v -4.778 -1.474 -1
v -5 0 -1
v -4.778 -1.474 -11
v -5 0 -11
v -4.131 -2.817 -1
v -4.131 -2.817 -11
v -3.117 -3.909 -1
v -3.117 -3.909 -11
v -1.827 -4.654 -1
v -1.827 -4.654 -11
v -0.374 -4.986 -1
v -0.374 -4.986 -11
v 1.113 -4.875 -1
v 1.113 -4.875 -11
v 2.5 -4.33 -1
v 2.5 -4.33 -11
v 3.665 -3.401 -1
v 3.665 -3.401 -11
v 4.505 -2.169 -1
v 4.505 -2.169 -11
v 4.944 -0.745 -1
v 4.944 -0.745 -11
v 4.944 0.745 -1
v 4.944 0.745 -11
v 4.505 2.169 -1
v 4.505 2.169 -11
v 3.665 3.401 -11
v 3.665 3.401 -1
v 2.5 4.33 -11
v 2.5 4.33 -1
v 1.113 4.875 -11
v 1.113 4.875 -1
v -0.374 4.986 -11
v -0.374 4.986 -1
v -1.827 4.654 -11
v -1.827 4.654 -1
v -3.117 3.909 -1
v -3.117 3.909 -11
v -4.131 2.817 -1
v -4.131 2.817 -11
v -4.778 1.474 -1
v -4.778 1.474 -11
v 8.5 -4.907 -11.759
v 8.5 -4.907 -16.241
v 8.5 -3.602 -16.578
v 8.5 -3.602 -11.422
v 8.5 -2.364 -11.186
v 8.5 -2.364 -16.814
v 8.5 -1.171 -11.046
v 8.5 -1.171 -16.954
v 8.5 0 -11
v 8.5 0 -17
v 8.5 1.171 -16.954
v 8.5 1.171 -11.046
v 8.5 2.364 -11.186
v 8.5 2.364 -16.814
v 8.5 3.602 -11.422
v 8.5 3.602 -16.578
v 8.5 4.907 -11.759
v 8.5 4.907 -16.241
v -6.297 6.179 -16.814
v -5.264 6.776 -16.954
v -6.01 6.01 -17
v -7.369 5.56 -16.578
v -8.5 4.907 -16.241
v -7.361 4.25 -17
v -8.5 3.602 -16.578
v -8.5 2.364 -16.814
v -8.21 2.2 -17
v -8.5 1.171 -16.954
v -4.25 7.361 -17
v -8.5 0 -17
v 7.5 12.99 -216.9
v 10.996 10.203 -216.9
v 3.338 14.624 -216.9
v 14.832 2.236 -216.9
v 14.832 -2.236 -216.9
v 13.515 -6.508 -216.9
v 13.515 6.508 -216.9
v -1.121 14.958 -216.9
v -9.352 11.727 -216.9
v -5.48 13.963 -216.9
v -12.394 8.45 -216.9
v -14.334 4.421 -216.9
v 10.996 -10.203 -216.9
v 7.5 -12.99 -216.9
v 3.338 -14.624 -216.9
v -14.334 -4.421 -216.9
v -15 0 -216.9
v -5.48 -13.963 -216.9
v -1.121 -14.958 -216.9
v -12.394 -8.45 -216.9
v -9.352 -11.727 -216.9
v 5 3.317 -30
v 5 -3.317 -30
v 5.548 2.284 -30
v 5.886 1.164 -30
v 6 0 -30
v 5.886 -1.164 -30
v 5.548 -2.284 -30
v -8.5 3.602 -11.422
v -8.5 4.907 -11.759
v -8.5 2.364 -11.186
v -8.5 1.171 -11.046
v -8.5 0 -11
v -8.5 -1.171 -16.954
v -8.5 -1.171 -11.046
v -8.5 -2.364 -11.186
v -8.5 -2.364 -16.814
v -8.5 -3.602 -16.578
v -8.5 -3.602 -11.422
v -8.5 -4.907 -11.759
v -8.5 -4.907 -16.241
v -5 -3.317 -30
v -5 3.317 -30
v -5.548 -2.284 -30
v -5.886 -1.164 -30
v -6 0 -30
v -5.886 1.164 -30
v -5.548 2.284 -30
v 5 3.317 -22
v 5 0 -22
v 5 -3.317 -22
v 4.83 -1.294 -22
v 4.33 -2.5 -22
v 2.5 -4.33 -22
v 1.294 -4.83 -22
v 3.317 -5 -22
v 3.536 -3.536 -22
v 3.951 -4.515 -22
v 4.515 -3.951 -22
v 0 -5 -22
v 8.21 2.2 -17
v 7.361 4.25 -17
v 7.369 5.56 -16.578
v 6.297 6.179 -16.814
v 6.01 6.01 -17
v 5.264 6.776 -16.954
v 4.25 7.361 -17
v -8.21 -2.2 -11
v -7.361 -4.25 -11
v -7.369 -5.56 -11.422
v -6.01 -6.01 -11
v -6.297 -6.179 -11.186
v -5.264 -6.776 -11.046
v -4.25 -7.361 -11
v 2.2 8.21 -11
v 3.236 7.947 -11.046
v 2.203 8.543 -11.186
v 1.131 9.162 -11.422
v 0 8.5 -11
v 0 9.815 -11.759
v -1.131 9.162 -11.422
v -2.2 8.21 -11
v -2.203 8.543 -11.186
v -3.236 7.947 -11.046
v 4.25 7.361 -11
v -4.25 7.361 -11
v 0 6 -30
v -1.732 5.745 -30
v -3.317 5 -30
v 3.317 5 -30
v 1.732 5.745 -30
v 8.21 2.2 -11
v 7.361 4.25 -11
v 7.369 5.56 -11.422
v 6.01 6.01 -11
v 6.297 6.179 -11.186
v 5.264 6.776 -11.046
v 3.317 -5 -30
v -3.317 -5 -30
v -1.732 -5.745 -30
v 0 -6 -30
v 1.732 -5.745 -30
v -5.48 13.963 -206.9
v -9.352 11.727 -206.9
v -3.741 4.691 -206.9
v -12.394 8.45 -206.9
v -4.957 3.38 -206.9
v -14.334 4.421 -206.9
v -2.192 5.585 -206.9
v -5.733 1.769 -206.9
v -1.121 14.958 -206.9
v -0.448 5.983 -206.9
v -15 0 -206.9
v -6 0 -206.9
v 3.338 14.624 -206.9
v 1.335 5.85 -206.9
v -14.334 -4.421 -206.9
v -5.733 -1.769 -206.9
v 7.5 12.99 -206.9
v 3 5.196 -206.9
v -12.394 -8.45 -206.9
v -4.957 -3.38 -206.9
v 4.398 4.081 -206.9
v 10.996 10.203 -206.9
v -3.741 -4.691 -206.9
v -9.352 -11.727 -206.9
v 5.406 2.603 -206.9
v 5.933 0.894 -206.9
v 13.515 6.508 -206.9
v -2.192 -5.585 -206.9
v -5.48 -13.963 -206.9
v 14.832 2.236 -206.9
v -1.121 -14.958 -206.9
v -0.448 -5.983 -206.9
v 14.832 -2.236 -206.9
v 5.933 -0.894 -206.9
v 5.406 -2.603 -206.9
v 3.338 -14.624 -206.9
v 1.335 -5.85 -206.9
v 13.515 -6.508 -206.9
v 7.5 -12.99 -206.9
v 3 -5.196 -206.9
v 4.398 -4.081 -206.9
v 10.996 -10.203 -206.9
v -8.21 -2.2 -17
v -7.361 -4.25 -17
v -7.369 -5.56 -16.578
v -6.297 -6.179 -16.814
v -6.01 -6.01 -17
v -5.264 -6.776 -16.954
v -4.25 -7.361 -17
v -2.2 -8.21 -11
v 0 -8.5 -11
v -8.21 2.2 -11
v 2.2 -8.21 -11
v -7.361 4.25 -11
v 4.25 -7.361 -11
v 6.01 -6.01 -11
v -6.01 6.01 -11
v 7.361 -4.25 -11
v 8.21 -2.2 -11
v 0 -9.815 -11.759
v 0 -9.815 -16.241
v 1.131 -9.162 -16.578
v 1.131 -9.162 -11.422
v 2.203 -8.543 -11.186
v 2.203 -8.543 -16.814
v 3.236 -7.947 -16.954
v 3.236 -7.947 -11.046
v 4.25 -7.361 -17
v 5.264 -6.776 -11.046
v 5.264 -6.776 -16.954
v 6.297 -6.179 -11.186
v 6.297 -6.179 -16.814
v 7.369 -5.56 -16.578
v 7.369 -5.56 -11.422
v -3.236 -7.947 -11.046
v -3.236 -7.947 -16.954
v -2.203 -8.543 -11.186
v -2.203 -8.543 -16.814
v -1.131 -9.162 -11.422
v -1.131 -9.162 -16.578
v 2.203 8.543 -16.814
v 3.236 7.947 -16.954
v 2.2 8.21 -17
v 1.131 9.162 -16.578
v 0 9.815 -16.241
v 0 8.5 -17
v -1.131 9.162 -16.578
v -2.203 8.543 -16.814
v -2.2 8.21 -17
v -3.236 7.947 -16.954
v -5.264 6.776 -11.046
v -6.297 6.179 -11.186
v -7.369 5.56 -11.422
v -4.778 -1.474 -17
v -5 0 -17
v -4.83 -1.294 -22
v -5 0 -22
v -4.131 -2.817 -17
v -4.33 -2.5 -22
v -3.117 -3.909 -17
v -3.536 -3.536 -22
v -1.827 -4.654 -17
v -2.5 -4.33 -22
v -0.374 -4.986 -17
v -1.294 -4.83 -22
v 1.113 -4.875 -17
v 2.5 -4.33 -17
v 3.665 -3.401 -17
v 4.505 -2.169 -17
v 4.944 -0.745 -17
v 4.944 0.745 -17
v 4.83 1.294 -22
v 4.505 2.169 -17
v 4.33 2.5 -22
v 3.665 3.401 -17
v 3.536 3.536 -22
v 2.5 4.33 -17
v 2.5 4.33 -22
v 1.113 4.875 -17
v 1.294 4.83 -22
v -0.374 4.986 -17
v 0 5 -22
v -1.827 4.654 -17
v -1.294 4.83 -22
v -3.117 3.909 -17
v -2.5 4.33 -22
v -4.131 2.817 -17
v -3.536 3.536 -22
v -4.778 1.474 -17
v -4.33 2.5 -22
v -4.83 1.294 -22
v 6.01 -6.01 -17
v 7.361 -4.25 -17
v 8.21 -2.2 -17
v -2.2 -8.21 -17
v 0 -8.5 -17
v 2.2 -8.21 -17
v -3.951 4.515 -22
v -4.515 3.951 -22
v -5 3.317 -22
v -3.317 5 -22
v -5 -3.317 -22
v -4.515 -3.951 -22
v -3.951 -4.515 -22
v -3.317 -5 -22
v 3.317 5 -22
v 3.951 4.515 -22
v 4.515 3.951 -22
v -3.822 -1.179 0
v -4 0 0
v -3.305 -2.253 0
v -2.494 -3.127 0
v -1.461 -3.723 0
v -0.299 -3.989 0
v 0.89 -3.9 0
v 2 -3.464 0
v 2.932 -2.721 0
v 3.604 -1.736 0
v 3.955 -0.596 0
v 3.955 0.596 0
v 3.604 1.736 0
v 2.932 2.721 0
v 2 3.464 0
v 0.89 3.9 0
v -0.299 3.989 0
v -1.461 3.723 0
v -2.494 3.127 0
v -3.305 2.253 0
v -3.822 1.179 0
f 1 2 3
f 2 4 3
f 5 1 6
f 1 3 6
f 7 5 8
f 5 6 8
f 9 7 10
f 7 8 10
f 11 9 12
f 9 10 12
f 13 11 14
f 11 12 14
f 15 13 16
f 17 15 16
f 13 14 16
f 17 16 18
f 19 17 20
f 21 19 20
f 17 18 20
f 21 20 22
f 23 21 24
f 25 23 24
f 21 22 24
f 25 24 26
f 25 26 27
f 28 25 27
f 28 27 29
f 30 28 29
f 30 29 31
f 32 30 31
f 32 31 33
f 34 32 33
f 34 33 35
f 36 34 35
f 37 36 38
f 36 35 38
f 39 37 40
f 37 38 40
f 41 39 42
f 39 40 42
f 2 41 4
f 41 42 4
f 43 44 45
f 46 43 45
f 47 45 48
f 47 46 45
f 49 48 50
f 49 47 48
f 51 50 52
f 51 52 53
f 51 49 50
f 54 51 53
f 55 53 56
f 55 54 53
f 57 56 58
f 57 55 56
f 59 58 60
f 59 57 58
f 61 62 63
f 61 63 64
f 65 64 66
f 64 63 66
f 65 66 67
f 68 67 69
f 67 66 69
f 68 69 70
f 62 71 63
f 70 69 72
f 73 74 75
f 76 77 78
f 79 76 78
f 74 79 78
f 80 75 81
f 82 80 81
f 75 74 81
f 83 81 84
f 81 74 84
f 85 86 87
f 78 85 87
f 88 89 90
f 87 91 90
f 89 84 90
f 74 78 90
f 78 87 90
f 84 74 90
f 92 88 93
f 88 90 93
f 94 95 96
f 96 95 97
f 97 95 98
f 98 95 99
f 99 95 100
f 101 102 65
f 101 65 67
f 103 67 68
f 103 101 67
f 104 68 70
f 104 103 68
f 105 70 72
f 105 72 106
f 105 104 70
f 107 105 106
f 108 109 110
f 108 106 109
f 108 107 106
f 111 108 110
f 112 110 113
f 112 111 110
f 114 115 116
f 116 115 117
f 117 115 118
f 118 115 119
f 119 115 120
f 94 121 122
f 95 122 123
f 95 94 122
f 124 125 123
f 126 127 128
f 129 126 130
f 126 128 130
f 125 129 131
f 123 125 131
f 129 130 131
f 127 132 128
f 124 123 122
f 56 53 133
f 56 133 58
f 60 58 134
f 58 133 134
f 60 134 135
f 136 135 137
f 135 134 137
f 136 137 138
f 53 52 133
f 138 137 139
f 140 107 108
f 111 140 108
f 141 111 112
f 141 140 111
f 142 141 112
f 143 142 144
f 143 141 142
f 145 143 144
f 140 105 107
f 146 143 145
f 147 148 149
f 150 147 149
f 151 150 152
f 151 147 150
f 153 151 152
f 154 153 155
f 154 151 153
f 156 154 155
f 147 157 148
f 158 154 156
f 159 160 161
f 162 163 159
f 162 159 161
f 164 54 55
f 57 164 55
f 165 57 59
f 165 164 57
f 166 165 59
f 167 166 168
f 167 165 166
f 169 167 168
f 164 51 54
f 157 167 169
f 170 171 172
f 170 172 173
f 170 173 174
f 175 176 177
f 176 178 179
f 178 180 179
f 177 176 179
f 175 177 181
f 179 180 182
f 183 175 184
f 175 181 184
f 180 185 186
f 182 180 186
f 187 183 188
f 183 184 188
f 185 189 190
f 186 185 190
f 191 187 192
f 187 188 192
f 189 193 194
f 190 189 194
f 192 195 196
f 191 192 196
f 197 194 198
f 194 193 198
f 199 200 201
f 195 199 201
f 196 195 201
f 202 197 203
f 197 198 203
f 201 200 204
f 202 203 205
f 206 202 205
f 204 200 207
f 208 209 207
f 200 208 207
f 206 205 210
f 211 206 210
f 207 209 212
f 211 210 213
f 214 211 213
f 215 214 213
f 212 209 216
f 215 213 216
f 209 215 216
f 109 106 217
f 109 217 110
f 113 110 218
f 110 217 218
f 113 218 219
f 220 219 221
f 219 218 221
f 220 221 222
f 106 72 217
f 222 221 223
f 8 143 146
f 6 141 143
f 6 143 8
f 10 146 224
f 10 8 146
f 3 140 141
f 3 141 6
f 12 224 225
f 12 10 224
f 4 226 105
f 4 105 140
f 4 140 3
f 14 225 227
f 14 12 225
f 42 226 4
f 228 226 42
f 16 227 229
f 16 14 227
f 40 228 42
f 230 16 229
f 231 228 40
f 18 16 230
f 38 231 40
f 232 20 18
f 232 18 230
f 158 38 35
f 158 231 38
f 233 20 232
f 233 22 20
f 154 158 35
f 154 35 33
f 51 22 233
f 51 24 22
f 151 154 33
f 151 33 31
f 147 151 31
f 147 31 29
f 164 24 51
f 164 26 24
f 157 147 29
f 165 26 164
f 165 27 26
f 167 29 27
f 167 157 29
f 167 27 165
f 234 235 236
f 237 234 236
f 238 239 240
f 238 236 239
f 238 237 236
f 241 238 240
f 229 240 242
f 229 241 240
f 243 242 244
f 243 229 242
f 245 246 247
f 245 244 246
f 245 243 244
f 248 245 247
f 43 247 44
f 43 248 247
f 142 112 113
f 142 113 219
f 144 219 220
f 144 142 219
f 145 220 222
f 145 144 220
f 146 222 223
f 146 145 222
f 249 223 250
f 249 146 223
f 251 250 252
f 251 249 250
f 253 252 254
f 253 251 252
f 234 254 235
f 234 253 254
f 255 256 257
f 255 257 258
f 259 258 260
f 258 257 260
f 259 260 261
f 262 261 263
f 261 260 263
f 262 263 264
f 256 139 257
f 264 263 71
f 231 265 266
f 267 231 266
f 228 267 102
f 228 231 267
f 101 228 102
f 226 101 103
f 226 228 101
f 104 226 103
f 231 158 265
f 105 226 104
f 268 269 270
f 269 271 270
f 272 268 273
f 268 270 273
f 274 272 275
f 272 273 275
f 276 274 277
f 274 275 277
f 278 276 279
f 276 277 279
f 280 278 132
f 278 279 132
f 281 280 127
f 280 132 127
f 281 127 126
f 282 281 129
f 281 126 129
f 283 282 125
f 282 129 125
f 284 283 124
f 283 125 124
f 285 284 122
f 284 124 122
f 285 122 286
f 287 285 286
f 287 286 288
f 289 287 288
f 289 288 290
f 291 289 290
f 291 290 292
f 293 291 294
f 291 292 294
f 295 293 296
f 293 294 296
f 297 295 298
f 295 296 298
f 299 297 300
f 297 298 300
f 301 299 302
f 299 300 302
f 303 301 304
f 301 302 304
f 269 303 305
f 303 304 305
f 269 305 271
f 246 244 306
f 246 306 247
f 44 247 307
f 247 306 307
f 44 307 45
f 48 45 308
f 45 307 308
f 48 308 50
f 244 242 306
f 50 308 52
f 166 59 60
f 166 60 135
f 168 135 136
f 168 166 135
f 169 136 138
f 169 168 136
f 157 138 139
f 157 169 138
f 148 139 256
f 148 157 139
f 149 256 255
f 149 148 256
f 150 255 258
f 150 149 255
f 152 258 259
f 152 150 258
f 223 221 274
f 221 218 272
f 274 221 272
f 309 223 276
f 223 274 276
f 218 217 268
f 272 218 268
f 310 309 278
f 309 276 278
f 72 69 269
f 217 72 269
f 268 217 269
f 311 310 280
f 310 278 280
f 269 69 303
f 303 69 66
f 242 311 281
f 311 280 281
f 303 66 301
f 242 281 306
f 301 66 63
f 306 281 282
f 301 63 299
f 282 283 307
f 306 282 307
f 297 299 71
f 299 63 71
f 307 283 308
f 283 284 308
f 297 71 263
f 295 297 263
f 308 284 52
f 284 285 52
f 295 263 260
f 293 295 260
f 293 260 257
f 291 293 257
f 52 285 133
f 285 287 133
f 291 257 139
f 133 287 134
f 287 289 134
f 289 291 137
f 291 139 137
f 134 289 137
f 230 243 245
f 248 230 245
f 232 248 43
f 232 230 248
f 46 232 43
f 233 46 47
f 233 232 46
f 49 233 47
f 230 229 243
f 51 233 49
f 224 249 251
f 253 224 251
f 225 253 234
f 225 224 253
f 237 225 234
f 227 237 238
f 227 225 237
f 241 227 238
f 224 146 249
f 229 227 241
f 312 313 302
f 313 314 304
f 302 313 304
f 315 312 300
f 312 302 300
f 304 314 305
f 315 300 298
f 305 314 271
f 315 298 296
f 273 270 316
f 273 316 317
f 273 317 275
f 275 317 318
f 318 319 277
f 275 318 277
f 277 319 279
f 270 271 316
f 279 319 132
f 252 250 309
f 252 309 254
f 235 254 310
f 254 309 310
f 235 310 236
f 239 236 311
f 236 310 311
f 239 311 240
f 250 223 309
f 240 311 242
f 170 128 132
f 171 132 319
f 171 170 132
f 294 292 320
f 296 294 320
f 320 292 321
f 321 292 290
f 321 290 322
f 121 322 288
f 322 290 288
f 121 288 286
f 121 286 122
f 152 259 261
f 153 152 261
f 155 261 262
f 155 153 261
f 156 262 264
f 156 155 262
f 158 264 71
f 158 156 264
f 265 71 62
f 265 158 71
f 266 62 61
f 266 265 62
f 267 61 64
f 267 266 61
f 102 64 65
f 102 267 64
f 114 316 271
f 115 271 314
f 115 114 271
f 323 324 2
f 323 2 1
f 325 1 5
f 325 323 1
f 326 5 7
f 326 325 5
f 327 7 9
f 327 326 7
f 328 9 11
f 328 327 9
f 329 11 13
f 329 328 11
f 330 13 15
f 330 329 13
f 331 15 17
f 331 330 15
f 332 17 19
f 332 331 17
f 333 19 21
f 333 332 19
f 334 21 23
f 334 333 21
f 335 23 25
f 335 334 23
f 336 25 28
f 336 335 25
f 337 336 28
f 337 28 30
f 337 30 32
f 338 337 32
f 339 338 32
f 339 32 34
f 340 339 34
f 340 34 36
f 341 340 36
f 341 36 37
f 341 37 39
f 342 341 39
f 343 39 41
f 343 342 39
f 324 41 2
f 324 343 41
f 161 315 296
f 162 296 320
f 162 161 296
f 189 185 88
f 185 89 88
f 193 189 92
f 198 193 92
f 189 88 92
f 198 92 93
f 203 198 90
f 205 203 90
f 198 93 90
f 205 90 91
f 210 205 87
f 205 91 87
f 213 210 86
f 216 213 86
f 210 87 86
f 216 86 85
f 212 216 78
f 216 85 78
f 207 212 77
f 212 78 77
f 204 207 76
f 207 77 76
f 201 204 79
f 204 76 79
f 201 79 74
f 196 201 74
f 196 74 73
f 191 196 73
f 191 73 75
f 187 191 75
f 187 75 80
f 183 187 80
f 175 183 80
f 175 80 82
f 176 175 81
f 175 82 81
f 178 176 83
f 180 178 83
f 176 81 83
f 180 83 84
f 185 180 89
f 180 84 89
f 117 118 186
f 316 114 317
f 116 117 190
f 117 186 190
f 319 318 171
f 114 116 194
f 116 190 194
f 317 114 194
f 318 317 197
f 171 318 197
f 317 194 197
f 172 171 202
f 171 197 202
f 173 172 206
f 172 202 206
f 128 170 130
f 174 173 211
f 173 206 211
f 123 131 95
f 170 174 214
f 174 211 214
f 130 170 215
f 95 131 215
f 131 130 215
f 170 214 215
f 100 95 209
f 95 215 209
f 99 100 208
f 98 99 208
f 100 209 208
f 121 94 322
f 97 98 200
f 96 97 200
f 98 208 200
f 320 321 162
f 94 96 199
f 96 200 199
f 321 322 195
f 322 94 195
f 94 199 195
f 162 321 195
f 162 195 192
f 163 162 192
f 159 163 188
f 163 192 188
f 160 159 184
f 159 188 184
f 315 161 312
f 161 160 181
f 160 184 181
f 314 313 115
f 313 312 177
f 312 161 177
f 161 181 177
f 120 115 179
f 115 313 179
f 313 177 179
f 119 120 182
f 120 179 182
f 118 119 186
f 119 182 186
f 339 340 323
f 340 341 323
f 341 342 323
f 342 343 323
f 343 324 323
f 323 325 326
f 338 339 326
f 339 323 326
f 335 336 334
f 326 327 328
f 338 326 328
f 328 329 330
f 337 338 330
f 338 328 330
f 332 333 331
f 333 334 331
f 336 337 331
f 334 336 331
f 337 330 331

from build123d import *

# Parameters (mm, degrees)
EXTRUDE_1_DEPTH      = 6
SKETCH_5_3_OUTSIDE_W = 103.914
SKETCH_5_3_OUTSIDE_H = 103.914
SKETCH_5_3_OUTSIDE_R = 8.5
CUT_EXTRUDE_1_DEPTH  = 8
CUT_EXTRUDE_1_DRAFT  = -60
CUT_EXTRUDE_START    = -6
SKETCH_5_4_OUTSIDE_W = 103.914
SKETCH_5_4_OUTSIDE_H = 103.914
SKETCH_5_4_OUTSIDE_R = 8.5
CUT_EXTRUDE_2_DEPTH  = 8
CUT_EXTRUDE_2_DRAFT  = 60
CUT_EXTRUDE_START_2  = -8
CUT_EXTRUDE_3_DEPTH  = 8
CHAMFER_1_SIZE       = 1


with BuildPart() as part:
    # 草图4 → 旋转1 (revolve)
    with BuildSketch(Plane(origin=(0, 0, 0), x_dir=(0, 0, -1), z_dir=(1, 0, 0)), mode=Mode.PRIVATE) as revolve_1_sk:
        Polygon((206.9, 6), (206.9, 15), (216.9, 15), (216.9, 0), (0, 0), (0, 5), (22, 5), (22, 6), align=None)
    revolve(revolve_1_sk.sketch.rotate(Axis((0, 0, -216.9), (0, 0, 1)), 90), axis=Axis((0, 0, -216.9), (0, 0, 1)))

    # 草图6 → 切除-拉伸3 (cut)
    with BuildSketch(Plane.XY.offset(-22).offset(CUT_EXTRUDE_START_2)):
        with BuildLine():
            ThreePointArc((3.31662479, 5), (0, 6), (-3.31662479, 5))
            Line((-3.31662479, 5), (3.31662479, 5))
        make_face()
        with BuildLine():
            ThreePointArc((6, 0), (5.744562647, 1.732050808), (5, 3.31662479))
            Line((5, 3.31662479), (5, -3.31662479))
            ThreePointArc((5, -3.31662479), (5.744562647, -1.732050808), (6, 0))
        make_face()
        with BuildLine():
            Line((3.31662479, -5), (-3.31662479, -5))
            ThreePointArc((-3.31662479, -5), (0, -6), (3.31662479, -5))
        make_face()
        with BuildLine():
            Line((-5, -3.31662479), (-5, 3.31662479))
            ThreePointArc((-5, 3.31662479), (-6, 0), (-5, -3.31662479))
        make_face()
    extrude(amount=CUT_EXTRUDE_3_DEPTH, mode=Mode.SUBTRACT)

    # 倒角1
    chamfer_1_edges = [part.edges().sort_by_distance(p)[0] for p in [
        (5, 0, 0),
    ]]
    chamfer(chamfer_1_edges, length=CHAMFER_1_SIZE)


with BuildPart() as body_2:
    # 草图5 → 凸台-拉伸1 (new body)
    with BuildSketch(Plane.XY.offset(-11)):
        Polygon((0, 9.814954576), (-8.5, 4.907477288), (-8.5, -4.907477288), (0, -9.814954576), (8.5, -4.907477288), (8.5, 4.907477288), align=None)
    extrude(amount=-EXTRUDE_1_DEPTH)


with BuildPart() as cut_extrude_1_tool:
    # 草图5<3> outside → 切除-拉伸1 (with draft: the straight prism first)
    with BuildSketch(Plane.XY.offset(-11)):
        Rectangle(SKETCH_5_3_OUTSIDE_W, SKETCH_5_3_OUTSIDE_H)
        Circle(SKETCH_5_3_OUTSIDE_R, mode=Mode.SUBTRACT)
    extrude(amount=-CUT_EXTRUDE_1_DEPTH)
    # 切除-拉伸1: the draft: its side faces are tilted about the plane it starts from
    cut_extrude_1_sides = [cut_extrude_1_tool.faces().sort_by_distance(p)[0] for p in [
        (0, -51.957, -15),
        (51.957, 0, -15),
        (0, 51.957, -15),
        (-51.957, 0, -15),
        (-8.5, 0, -15),
    ]]
    draft(cut_extrude_1_sides, Plane.XY.offset(-11), CUT_EXTRUDE_1_DRAFT)


with BuildPart() as body_2_1:
    add(body_2.part)

    # 切除-拉伸1: cut by cut_extrude_1_tool
    add(cut_extrude_1_tool.part, mode=Mode.SUBTRACT)


with BuildPart() as cut_extrude_2_tool:
    # 草图5<4> outside → 切除-拉伸2 (with draft: the straight prism first)
    with BuildSketch(Plane.XY.offset(-11).offset(CUT_EXTRUDE_START)):
        Rectangle(SKETCH_5_4_OUTSIDE_W, SKETCH_5_4_OUTSIDE_H)
        Circle(SKETCH_5_4_OUTSIDE_R, mode=Mode.SUBTRACT)
    extrude(amount=CUT_EXTRUDE_2_DEPTH)
    # 切除-拉伸2: the draft: its side faces are tilted about the plane it starts from
    cut_extrude_2_sides = [cut_extrude_2_tool.faces().sort_by_distance(p)[0] for p in [
        (0, -51.957, -13),
        (51.957, 0, -13),
        (0, 51.957, -13),
        (-51.957, 0, -13),
        (-8.5, 0, -13),
    ]]
    draft(cut_extrude_2_sides, Plane.XY.offset(-11).offset(CUT_EXTRUDE_START), CUT_EXTRUDE_2_DRAFT)


with BuildPart() as body_2_2:
    add(body_2_1.part)

    # 切除-拉伸2: cut by cut_extrude_2_tool
    add(cut_extrude_2_tool.part, mode=Mode.SUBTRACT)

    # Combine 1: union part
    add(part.part)


solid = body_2_2.part
